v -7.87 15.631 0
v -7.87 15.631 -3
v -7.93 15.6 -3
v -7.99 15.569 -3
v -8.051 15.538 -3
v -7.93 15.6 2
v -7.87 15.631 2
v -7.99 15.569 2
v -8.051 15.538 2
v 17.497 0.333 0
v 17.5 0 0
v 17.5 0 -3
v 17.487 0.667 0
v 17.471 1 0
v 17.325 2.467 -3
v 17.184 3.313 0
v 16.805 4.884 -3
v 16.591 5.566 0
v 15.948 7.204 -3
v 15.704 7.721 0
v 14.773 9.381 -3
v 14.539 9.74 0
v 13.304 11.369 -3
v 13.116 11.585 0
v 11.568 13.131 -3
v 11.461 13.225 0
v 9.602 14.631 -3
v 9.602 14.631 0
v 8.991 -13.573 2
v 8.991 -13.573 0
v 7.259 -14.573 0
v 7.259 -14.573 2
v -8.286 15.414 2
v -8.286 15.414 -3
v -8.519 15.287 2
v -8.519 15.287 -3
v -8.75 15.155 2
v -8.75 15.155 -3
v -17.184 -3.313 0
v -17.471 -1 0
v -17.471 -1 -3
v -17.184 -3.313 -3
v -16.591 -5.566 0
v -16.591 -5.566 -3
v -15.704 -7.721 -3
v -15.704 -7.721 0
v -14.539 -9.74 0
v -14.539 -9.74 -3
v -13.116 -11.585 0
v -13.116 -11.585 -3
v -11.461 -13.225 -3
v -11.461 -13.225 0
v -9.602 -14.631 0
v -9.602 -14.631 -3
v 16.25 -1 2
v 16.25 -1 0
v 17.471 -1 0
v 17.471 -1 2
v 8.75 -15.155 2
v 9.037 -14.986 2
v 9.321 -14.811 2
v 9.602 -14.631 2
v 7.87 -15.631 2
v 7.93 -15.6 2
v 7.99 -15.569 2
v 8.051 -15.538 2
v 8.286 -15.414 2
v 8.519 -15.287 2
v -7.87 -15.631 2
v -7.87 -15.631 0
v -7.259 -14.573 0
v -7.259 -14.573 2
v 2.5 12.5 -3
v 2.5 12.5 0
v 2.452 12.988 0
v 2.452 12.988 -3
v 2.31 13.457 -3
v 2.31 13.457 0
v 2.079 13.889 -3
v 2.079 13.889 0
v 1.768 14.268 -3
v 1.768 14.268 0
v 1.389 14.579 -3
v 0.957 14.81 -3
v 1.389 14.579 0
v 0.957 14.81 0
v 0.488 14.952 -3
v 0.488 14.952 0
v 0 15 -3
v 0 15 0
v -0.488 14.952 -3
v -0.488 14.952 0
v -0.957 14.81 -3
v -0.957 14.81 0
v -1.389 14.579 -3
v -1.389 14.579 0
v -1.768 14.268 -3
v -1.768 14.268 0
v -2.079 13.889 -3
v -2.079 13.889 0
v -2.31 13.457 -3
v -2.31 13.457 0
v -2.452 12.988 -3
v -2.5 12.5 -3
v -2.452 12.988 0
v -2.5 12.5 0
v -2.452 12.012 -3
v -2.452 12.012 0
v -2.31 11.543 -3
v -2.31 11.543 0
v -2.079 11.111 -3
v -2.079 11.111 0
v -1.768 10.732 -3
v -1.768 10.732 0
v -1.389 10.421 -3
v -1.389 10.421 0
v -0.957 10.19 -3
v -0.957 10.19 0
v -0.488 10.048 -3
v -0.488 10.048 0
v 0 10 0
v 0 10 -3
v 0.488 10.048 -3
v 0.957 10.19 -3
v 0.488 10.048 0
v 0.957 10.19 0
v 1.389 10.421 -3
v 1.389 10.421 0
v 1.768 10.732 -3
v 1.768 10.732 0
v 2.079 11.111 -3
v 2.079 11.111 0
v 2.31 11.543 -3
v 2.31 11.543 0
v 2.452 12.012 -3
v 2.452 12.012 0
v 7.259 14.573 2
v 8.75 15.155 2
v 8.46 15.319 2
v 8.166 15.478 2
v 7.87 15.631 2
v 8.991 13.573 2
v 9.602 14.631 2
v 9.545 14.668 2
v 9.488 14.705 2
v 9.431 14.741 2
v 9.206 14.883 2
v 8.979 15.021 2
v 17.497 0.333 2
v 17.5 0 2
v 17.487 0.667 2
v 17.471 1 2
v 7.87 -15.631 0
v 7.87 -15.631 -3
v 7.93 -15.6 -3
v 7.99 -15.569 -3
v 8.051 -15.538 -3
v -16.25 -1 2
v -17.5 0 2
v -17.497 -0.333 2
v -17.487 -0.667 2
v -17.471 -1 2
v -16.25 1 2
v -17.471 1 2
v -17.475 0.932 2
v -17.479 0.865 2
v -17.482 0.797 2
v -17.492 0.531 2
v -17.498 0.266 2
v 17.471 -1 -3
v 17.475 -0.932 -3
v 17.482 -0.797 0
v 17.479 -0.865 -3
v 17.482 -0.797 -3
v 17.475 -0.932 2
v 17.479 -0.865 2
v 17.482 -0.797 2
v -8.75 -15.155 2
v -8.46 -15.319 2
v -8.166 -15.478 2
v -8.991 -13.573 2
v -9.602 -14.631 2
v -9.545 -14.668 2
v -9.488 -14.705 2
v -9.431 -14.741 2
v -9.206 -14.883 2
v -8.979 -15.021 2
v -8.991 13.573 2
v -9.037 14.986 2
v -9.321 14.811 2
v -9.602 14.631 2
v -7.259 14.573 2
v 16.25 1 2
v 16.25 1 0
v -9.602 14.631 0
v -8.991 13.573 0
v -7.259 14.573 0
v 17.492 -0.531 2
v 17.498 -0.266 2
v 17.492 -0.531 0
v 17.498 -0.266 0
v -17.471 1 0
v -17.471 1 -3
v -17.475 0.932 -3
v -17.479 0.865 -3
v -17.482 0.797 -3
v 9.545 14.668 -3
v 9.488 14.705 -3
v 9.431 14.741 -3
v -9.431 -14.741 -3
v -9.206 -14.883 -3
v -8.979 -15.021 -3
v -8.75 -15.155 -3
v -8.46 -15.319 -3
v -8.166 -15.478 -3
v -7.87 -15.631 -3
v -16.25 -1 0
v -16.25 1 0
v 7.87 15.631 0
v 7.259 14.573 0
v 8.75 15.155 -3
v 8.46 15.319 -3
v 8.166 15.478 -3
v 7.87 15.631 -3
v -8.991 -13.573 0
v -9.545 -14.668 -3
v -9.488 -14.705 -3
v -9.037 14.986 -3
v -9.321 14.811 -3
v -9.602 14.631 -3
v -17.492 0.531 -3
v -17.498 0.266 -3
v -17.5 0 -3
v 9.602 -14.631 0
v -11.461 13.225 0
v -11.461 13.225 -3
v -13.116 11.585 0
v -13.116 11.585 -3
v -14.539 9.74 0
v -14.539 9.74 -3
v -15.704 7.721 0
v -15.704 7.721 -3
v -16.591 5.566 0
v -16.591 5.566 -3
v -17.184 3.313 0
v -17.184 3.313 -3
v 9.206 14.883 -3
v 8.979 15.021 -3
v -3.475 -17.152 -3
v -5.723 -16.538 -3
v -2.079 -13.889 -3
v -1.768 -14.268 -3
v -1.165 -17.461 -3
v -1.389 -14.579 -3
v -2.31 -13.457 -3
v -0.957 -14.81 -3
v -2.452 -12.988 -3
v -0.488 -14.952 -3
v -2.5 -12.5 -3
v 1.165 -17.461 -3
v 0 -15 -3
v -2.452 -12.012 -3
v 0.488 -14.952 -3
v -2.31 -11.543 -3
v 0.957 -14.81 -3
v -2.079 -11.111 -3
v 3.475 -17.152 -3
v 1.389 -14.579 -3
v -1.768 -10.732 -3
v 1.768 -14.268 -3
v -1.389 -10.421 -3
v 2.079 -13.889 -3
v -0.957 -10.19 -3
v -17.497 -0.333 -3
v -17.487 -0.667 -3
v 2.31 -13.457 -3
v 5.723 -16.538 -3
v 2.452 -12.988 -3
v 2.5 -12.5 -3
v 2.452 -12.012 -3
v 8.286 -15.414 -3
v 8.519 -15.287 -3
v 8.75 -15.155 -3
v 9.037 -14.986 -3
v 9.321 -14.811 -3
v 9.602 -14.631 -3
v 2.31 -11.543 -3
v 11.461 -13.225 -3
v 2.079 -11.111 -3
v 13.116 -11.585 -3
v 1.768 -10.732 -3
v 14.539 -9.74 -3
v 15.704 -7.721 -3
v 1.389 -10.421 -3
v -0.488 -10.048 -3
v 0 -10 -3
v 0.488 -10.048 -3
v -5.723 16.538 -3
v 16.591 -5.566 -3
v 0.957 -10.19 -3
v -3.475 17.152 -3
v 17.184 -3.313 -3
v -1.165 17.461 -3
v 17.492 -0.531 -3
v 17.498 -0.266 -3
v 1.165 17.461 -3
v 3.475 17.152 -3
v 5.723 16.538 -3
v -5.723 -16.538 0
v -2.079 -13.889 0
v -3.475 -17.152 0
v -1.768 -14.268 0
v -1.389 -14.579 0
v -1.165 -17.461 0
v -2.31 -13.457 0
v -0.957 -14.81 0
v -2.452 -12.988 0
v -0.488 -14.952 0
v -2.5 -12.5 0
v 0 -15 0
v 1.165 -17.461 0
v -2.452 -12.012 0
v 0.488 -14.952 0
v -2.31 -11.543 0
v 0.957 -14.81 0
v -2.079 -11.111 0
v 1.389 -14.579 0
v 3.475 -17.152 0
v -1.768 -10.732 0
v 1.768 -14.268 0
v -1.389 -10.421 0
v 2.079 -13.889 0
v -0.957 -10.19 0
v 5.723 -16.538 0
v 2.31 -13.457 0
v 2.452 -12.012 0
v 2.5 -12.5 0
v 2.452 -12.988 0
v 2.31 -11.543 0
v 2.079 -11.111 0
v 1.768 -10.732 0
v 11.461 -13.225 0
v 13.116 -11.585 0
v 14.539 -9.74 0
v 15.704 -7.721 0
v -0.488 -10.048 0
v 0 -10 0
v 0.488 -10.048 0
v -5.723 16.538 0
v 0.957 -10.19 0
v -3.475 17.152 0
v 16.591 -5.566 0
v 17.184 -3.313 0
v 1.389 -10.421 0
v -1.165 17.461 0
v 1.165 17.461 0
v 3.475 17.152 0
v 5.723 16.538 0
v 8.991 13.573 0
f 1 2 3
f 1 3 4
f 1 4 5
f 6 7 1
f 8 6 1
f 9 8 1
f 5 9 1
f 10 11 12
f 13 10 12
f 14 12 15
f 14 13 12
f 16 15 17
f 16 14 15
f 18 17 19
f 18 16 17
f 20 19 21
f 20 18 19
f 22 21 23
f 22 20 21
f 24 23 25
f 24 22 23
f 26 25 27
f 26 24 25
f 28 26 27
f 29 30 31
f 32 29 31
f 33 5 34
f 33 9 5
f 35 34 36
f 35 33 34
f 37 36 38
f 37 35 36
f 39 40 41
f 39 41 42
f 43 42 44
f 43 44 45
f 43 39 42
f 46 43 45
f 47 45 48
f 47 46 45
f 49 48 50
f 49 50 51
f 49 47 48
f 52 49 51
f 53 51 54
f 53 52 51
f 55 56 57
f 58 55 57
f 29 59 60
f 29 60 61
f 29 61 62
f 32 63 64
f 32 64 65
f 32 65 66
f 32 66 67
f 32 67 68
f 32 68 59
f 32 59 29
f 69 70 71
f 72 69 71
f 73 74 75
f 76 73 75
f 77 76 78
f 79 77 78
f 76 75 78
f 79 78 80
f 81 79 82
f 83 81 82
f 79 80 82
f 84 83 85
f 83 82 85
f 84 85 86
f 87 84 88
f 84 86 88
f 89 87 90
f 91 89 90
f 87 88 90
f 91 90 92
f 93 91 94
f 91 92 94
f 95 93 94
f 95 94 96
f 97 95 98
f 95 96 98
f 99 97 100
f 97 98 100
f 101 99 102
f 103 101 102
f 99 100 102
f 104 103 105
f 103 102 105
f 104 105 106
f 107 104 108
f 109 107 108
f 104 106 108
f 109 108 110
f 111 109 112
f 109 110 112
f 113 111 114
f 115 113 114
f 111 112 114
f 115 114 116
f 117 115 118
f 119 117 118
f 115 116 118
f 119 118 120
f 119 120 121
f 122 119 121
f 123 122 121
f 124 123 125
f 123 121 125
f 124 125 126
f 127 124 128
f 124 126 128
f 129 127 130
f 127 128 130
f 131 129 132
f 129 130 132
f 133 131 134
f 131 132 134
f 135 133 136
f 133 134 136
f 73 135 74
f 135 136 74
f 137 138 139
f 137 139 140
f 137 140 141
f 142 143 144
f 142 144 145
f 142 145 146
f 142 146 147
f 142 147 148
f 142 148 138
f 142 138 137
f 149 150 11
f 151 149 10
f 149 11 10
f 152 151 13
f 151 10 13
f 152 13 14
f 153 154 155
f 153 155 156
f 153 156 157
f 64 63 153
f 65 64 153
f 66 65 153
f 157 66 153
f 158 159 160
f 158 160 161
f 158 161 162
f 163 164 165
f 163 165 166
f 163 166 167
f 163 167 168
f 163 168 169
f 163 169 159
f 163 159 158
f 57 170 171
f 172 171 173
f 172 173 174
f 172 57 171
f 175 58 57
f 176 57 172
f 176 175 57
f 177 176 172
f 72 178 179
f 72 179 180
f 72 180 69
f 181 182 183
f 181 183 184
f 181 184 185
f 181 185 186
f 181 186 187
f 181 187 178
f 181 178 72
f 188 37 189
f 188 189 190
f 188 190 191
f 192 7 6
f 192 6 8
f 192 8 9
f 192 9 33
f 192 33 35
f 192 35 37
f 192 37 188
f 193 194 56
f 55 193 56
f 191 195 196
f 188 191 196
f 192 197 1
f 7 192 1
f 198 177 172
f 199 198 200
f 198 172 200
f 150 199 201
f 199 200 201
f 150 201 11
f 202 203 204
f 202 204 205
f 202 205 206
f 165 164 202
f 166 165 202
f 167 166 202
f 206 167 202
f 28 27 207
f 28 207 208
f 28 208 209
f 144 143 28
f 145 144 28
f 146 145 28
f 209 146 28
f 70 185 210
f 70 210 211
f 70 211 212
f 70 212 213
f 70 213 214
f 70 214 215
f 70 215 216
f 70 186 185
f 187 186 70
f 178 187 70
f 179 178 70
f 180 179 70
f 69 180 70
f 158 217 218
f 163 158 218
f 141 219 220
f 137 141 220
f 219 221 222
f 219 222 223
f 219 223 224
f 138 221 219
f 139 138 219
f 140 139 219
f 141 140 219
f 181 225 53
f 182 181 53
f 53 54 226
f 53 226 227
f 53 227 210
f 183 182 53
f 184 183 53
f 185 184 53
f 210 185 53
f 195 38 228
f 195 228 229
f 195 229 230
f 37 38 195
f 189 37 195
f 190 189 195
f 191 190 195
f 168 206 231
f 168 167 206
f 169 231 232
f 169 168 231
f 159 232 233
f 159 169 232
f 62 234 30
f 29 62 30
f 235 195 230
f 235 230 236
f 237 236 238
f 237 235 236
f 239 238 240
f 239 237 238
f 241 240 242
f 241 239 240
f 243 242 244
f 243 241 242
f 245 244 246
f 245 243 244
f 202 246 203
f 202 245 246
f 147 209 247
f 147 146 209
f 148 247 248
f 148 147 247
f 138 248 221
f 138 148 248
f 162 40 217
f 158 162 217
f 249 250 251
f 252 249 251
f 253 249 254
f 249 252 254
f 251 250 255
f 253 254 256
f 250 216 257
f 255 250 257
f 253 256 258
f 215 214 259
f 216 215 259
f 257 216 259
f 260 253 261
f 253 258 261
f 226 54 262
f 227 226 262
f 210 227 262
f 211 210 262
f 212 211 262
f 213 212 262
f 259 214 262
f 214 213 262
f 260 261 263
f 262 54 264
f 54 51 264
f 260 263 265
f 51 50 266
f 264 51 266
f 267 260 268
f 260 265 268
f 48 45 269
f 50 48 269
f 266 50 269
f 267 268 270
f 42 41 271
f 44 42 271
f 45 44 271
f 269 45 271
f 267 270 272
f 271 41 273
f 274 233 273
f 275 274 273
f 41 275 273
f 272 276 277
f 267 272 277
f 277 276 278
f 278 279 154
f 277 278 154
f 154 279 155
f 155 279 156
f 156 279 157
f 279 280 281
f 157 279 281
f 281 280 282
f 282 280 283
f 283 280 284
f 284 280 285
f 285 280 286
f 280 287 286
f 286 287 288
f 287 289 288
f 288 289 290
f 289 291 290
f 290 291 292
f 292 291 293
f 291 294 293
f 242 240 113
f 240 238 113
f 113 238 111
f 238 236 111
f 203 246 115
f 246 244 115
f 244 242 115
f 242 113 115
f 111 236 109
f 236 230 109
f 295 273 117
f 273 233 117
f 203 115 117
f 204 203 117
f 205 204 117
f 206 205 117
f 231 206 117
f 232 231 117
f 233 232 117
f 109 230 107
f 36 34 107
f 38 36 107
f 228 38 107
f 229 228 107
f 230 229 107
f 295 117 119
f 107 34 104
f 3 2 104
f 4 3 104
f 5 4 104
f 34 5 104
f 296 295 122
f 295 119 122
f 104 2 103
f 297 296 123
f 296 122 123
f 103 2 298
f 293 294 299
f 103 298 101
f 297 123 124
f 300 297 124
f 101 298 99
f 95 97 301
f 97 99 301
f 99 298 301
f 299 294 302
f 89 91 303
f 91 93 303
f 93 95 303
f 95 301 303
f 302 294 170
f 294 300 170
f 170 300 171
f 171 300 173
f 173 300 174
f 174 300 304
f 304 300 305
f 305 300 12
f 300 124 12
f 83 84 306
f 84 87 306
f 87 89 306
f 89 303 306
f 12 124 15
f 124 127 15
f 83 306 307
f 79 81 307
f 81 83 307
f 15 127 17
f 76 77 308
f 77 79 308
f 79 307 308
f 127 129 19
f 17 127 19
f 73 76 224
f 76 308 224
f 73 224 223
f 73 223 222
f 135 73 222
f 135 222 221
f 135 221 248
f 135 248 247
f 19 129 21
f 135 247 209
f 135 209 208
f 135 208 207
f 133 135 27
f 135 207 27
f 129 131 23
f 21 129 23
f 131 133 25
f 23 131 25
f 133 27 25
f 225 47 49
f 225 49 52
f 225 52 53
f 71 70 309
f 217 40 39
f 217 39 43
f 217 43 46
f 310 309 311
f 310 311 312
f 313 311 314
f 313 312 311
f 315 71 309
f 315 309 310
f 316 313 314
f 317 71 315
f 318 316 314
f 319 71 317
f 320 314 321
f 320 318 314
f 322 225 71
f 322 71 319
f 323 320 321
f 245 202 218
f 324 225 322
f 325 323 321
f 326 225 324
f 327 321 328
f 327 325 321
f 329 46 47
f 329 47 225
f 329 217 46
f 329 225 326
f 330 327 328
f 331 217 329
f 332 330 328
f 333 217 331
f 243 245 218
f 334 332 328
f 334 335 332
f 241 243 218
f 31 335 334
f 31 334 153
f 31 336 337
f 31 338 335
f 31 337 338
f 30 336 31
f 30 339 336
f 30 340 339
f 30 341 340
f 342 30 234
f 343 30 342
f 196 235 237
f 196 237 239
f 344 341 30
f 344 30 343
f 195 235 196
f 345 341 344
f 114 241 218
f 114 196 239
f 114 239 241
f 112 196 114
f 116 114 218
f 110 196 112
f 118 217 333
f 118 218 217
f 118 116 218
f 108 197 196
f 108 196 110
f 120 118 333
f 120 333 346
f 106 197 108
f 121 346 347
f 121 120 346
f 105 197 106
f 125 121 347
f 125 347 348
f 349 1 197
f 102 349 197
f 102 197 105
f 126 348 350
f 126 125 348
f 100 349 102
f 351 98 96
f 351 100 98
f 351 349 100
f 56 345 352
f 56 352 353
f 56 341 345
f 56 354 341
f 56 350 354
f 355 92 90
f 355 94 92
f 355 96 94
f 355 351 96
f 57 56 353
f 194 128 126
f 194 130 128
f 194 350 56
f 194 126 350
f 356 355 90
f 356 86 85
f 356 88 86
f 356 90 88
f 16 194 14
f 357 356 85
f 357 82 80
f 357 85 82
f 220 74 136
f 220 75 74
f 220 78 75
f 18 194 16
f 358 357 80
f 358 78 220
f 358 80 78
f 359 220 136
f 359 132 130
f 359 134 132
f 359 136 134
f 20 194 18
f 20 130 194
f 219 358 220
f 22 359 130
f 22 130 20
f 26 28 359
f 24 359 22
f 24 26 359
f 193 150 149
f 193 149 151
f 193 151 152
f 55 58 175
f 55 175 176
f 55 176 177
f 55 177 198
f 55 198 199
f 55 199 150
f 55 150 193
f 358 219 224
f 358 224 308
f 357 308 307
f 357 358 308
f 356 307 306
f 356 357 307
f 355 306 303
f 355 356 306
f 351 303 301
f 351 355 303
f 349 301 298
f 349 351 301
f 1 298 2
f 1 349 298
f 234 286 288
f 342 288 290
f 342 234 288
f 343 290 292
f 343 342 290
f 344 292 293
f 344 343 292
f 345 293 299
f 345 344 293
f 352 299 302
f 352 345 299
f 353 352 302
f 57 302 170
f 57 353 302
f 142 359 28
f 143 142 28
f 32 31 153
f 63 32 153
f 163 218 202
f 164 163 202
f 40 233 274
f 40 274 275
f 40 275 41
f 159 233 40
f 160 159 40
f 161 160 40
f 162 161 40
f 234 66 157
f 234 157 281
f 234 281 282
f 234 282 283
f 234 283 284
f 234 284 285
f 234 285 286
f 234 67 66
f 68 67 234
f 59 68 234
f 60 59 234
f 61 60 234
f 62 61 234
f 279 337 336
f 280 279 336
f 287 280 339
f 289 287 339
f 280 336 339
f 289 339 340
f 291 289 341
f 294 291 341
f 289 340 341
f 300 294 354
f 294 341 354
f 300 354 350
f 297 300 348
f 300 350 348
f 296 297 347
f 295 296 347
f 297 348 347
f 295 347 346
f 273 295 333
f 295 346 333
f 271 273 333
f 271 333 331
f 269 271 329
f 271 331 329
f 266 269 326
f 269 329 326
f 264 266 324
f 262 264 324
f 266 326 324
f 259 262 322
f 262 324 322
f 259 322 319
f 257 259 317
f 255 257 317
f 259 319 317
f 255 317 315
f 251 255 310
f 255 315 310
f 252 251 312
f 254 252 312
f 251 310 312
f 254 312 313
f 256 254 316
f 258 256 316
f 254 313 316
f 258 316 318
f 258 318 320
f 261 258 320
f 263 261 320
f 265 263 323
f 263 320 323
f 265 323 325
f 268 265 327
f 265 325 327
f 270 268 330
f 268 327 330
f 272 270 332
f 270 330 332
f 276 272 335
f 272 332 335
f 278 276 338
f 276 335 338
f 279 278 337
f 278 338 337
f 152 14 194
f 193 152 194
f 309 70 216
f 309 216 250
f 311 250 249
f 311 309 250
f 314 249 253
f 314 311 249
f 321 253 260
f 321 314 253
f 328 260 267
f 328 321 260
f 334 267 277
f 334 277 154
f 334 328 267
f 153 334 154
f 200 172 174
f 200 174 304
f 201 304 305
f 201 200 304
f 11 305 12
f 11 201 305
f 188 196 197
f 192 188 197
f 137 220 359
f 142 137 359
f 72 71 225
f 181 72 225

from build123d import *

# Parameters (mm, degrees)
F2_DEPTH = 2
F0_R     = 2.5
F3_DEPTH = 3
F4_COUNT = 6
F5_DEPTH = 3


with BuildPart() as f2:
    # F0 (on Top) → F2 (new body)
    with BuildSketch(Plane.XY):
        with BuildLine():
            Line((-16.25, 1), (-17.4714052097, 1))
            ThreePointArc((-17.4714052097, 1), (-17.4769180723, 0.8985180536), (-17.4818414863, 0.7970058027))
            ThreePointArc((-17.4818414863, 0.7970058027), (-17.4954597826, 0.3986063162), (-17.5, 0))
            ThreePointArc((-17.5, 0), (-17.4928498417, -0.5002043737), (-17.4714052097, -1))
            Line((-17.4714052097, -1), (-16.25, -1))
            Line((-16.25, -1), (-16.25, 1))
        make_face()
    extrude(amount=F2_DEPTH)

    # F0 (on Top) → F3 (join)
    with BuildSketch(Plane.XY):
        with BuildLine():
            ThreePointArc((-17.4714052097, -1), (0.5002043737, -17.4928498417), (17.5, 0))
            ThreePointArc((17.5, 0), (0.5002043737, 17.4928498417), (-17.4714052097, 1))
            Line((-17.4714052097, 1), (-16.25, 1))
            Line((-16.25, 1), (-16.25, -1))
            Line((-16.25, -1), (-17.4714052097, -1))
        make_face()
        with Locations((0, -12.5)):
            Circle(F0_R, mode=Mode.SUBTRACT)
        with Locations((0, 12.5)):
            Circle(F0_R, mode=Mode.SUBTRACT)
        with BuildLine():
            Line((-16.25, 1), (-17.4714052097, 1))
            ThreePointArc((-17.4714052097, 1), (-17.4769180723, 0.8985180536), (-17.4818414863, 0.7970058027))
            ThreePointArc((-17.4818414863, 0.7970058027), (-17.4954597826, 0.3986063162), (-17.5, 0))
            ThreePointArc((-17.5, 0), (-17.4928498417, -0.5002043737), (-17.4714052097, -1))
            Line((-17.4714052097, -1), (-16.25, -1))
            Line((-16.25, -1), (-16.25, 1))
        make_face()
    extrude(amount=-F3_DEPTH)

    # F4: F2 ×6 about axis
    f4_axis = Axis((0, 0, 0), (0, 0, 1))


with BuildPart() as f2_1:
    add(f2.part)
    for i in range(1, F4_COUNT):
        add(f2.part.rotate(f4_axis, i * 360 / F4_COUNT))

    # F0 (on Top) → F5 (cut, through all)
    with BuildSketch(Plane.XY):
        with Locations((0, -12.5)):
            Circle(F0_R)
        with Locations((0, 12.5)):
            Circle(F0_R)
    extrude(amount=-F5_DEPTH, mode=Mode.SUBTRACT)


solid = f2_1.part
